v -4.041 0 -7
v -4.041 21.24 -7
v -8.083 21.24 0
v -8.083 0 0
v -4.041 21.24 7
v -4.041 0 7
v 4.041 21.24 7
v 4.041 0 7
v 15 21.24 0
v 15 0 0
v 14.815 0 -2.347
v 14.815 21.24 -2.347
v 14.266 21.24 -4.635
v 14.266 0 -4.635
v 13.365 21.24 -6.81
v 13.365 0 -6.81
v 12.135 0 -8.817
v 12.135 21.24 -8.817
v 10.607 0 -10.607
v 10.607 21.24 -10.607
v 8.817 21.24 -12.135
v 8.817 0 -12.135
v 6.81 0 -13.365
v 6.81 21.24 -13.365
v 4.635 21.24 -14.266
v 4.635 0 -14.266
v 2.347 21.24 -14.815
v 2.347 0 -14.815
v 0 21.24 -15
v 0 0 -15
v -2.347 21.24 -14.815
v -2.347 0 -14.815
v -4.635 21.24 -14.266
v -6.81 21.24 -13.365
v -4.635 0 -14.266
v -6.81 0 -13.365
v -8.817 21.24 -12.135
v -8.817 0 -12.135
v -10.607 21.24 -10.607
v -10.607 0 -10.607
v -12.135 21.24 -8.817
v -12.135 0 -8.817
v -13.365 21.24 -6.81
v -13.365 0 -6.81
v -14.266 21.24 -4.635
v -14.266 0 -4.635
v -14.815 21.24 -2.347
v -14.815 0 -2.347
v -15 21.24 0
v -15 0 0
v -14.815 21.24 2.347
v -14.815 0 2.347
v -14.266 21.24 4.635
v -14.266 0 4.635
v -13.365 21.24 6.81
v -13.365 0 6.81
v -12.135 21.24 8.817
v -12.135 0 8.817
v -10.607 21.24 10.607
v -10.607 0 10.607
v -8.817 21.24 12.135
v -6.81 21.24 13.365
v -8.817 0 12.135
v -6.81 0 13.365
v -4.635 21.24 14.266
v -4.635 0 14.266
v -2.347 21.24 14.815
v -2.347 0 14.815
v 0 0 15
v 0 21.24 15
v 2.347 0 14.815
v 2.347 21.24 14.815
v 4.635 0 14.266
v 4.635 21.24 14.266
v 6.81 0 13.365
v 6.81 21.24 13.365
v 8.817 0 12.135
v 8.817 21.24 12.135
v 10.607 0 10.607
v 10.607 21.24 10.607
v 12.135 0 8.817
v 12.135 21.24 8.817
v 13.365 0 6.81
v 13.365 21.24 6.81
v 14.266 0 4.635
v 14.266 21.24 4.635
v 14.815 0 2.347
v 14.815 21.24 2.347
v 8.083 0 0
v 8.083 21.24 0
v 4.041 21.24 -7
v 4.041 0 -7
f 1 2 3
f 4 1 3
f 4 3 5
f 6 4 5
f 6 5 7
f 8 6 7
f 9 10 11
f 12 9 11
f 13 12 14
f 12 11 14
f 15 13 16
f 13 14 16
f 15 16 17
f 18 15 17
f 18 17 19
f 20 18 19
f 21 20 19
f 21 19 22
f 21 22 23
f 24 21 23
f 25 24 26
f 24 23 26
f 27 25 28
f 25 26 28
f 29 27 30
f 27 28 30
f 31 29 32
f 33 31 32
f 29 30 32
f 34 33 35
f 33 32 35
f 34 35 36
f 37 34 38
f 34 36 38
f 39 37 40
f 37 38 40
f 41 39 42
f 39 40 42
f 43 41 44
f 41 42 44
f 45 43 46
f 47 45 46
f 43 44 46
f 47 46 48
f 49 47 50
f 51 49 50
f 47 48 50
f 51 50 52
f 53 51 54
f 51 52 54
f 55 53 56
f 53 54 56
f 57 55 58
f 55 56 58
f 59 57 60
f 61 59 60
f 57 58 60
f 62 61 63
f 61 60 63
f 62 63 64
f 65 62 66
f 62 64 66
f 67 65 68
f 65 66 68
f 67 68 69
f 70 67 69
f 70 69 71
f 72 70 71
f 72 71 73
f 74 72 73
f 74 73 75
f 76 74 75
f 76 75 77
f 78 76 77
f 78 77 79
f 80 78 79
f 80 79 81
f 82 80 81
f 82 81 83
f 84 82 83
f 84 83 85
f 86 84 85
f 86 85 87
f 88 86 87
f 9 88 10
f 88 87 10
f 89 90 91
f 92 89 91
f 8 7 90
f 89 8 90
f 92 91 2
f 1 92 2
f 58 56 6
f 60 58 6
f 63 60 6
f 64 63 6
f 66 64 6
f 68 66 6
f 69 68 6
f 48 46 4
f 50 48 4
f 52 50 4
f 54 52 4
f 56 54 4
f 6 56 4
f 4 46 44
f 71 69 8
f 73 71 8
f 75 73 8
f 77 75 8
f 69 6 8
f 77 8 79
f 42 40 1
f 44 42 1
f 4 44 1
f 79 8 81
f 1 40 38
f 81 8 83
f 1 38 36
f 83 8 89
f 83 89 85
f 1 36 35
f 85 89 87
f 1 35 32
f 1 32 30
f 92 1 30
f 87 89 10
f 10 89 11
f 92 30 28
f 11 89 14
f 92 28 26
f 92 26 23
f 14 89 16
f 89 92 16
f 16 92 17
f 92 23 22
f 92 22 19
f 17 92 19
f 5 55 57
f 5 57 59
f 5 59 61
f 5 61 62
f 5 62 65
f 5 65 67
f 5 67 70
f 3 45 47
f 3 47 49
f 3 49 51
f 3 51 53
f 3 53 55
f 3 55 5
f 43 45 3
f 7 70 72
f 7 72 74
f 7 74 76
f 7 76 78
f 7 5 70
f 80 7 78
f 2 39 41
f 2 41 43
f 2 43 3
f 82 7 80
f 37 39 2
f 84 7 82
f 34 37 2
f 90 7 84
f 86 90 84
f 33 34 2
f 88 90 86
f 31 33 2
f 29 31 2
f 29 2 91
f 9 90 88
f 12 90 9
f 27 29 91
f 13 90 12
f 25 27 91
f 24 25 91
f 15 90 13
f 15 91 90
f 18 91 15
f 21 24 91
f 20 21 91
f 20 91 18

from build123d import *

# Parameters (mm, degrees)
SKETCH1_R               = 15
BOSS_EXTRUDE1_DEPTH     = 21.24
CUT_EXTRUDE1_DEPTH      = 26
CUT_EXTRUDE1_DEPTH_BACK = 32


with BuildPart() as part:
    # Sketch1 → Boss-Extrude1 (new body)
    with BuildSketch(Plane(origin=(0, 0, 0), x_dir=(1, 0, 0), z_dir=(0, 1, 0))):
        Circle(SKETCH1_R)
    extrude(amount=BOSS_EXTRUDE1_DEPTH)

    # Sketch3 → Cut-Extrude1 (cut, two sides)
    with BuildSketch(Plane(origin=(0, 21.24, 0), x_dir=(1, 0, 0), z_dir=(0, 1, 0))) as cut_extrude1_sk:
        Polygon((8.082903769, 0), (4.041451884, 7), (-4.041451884, 7), (-8.082903769, 0), (-4.041451884, -7), (4.041451884, -7), align=None)
    extrude(amount=CUT_EXTRUDE1_DEPTH, mode=Mode.SUBTRACT)
    extrude(cut_extrude1_sk.sketch, amount=-CUT_EXTRUDE1_DEPTH_BACK, mode=Mode.SUBTRACT)


solid = part.part
